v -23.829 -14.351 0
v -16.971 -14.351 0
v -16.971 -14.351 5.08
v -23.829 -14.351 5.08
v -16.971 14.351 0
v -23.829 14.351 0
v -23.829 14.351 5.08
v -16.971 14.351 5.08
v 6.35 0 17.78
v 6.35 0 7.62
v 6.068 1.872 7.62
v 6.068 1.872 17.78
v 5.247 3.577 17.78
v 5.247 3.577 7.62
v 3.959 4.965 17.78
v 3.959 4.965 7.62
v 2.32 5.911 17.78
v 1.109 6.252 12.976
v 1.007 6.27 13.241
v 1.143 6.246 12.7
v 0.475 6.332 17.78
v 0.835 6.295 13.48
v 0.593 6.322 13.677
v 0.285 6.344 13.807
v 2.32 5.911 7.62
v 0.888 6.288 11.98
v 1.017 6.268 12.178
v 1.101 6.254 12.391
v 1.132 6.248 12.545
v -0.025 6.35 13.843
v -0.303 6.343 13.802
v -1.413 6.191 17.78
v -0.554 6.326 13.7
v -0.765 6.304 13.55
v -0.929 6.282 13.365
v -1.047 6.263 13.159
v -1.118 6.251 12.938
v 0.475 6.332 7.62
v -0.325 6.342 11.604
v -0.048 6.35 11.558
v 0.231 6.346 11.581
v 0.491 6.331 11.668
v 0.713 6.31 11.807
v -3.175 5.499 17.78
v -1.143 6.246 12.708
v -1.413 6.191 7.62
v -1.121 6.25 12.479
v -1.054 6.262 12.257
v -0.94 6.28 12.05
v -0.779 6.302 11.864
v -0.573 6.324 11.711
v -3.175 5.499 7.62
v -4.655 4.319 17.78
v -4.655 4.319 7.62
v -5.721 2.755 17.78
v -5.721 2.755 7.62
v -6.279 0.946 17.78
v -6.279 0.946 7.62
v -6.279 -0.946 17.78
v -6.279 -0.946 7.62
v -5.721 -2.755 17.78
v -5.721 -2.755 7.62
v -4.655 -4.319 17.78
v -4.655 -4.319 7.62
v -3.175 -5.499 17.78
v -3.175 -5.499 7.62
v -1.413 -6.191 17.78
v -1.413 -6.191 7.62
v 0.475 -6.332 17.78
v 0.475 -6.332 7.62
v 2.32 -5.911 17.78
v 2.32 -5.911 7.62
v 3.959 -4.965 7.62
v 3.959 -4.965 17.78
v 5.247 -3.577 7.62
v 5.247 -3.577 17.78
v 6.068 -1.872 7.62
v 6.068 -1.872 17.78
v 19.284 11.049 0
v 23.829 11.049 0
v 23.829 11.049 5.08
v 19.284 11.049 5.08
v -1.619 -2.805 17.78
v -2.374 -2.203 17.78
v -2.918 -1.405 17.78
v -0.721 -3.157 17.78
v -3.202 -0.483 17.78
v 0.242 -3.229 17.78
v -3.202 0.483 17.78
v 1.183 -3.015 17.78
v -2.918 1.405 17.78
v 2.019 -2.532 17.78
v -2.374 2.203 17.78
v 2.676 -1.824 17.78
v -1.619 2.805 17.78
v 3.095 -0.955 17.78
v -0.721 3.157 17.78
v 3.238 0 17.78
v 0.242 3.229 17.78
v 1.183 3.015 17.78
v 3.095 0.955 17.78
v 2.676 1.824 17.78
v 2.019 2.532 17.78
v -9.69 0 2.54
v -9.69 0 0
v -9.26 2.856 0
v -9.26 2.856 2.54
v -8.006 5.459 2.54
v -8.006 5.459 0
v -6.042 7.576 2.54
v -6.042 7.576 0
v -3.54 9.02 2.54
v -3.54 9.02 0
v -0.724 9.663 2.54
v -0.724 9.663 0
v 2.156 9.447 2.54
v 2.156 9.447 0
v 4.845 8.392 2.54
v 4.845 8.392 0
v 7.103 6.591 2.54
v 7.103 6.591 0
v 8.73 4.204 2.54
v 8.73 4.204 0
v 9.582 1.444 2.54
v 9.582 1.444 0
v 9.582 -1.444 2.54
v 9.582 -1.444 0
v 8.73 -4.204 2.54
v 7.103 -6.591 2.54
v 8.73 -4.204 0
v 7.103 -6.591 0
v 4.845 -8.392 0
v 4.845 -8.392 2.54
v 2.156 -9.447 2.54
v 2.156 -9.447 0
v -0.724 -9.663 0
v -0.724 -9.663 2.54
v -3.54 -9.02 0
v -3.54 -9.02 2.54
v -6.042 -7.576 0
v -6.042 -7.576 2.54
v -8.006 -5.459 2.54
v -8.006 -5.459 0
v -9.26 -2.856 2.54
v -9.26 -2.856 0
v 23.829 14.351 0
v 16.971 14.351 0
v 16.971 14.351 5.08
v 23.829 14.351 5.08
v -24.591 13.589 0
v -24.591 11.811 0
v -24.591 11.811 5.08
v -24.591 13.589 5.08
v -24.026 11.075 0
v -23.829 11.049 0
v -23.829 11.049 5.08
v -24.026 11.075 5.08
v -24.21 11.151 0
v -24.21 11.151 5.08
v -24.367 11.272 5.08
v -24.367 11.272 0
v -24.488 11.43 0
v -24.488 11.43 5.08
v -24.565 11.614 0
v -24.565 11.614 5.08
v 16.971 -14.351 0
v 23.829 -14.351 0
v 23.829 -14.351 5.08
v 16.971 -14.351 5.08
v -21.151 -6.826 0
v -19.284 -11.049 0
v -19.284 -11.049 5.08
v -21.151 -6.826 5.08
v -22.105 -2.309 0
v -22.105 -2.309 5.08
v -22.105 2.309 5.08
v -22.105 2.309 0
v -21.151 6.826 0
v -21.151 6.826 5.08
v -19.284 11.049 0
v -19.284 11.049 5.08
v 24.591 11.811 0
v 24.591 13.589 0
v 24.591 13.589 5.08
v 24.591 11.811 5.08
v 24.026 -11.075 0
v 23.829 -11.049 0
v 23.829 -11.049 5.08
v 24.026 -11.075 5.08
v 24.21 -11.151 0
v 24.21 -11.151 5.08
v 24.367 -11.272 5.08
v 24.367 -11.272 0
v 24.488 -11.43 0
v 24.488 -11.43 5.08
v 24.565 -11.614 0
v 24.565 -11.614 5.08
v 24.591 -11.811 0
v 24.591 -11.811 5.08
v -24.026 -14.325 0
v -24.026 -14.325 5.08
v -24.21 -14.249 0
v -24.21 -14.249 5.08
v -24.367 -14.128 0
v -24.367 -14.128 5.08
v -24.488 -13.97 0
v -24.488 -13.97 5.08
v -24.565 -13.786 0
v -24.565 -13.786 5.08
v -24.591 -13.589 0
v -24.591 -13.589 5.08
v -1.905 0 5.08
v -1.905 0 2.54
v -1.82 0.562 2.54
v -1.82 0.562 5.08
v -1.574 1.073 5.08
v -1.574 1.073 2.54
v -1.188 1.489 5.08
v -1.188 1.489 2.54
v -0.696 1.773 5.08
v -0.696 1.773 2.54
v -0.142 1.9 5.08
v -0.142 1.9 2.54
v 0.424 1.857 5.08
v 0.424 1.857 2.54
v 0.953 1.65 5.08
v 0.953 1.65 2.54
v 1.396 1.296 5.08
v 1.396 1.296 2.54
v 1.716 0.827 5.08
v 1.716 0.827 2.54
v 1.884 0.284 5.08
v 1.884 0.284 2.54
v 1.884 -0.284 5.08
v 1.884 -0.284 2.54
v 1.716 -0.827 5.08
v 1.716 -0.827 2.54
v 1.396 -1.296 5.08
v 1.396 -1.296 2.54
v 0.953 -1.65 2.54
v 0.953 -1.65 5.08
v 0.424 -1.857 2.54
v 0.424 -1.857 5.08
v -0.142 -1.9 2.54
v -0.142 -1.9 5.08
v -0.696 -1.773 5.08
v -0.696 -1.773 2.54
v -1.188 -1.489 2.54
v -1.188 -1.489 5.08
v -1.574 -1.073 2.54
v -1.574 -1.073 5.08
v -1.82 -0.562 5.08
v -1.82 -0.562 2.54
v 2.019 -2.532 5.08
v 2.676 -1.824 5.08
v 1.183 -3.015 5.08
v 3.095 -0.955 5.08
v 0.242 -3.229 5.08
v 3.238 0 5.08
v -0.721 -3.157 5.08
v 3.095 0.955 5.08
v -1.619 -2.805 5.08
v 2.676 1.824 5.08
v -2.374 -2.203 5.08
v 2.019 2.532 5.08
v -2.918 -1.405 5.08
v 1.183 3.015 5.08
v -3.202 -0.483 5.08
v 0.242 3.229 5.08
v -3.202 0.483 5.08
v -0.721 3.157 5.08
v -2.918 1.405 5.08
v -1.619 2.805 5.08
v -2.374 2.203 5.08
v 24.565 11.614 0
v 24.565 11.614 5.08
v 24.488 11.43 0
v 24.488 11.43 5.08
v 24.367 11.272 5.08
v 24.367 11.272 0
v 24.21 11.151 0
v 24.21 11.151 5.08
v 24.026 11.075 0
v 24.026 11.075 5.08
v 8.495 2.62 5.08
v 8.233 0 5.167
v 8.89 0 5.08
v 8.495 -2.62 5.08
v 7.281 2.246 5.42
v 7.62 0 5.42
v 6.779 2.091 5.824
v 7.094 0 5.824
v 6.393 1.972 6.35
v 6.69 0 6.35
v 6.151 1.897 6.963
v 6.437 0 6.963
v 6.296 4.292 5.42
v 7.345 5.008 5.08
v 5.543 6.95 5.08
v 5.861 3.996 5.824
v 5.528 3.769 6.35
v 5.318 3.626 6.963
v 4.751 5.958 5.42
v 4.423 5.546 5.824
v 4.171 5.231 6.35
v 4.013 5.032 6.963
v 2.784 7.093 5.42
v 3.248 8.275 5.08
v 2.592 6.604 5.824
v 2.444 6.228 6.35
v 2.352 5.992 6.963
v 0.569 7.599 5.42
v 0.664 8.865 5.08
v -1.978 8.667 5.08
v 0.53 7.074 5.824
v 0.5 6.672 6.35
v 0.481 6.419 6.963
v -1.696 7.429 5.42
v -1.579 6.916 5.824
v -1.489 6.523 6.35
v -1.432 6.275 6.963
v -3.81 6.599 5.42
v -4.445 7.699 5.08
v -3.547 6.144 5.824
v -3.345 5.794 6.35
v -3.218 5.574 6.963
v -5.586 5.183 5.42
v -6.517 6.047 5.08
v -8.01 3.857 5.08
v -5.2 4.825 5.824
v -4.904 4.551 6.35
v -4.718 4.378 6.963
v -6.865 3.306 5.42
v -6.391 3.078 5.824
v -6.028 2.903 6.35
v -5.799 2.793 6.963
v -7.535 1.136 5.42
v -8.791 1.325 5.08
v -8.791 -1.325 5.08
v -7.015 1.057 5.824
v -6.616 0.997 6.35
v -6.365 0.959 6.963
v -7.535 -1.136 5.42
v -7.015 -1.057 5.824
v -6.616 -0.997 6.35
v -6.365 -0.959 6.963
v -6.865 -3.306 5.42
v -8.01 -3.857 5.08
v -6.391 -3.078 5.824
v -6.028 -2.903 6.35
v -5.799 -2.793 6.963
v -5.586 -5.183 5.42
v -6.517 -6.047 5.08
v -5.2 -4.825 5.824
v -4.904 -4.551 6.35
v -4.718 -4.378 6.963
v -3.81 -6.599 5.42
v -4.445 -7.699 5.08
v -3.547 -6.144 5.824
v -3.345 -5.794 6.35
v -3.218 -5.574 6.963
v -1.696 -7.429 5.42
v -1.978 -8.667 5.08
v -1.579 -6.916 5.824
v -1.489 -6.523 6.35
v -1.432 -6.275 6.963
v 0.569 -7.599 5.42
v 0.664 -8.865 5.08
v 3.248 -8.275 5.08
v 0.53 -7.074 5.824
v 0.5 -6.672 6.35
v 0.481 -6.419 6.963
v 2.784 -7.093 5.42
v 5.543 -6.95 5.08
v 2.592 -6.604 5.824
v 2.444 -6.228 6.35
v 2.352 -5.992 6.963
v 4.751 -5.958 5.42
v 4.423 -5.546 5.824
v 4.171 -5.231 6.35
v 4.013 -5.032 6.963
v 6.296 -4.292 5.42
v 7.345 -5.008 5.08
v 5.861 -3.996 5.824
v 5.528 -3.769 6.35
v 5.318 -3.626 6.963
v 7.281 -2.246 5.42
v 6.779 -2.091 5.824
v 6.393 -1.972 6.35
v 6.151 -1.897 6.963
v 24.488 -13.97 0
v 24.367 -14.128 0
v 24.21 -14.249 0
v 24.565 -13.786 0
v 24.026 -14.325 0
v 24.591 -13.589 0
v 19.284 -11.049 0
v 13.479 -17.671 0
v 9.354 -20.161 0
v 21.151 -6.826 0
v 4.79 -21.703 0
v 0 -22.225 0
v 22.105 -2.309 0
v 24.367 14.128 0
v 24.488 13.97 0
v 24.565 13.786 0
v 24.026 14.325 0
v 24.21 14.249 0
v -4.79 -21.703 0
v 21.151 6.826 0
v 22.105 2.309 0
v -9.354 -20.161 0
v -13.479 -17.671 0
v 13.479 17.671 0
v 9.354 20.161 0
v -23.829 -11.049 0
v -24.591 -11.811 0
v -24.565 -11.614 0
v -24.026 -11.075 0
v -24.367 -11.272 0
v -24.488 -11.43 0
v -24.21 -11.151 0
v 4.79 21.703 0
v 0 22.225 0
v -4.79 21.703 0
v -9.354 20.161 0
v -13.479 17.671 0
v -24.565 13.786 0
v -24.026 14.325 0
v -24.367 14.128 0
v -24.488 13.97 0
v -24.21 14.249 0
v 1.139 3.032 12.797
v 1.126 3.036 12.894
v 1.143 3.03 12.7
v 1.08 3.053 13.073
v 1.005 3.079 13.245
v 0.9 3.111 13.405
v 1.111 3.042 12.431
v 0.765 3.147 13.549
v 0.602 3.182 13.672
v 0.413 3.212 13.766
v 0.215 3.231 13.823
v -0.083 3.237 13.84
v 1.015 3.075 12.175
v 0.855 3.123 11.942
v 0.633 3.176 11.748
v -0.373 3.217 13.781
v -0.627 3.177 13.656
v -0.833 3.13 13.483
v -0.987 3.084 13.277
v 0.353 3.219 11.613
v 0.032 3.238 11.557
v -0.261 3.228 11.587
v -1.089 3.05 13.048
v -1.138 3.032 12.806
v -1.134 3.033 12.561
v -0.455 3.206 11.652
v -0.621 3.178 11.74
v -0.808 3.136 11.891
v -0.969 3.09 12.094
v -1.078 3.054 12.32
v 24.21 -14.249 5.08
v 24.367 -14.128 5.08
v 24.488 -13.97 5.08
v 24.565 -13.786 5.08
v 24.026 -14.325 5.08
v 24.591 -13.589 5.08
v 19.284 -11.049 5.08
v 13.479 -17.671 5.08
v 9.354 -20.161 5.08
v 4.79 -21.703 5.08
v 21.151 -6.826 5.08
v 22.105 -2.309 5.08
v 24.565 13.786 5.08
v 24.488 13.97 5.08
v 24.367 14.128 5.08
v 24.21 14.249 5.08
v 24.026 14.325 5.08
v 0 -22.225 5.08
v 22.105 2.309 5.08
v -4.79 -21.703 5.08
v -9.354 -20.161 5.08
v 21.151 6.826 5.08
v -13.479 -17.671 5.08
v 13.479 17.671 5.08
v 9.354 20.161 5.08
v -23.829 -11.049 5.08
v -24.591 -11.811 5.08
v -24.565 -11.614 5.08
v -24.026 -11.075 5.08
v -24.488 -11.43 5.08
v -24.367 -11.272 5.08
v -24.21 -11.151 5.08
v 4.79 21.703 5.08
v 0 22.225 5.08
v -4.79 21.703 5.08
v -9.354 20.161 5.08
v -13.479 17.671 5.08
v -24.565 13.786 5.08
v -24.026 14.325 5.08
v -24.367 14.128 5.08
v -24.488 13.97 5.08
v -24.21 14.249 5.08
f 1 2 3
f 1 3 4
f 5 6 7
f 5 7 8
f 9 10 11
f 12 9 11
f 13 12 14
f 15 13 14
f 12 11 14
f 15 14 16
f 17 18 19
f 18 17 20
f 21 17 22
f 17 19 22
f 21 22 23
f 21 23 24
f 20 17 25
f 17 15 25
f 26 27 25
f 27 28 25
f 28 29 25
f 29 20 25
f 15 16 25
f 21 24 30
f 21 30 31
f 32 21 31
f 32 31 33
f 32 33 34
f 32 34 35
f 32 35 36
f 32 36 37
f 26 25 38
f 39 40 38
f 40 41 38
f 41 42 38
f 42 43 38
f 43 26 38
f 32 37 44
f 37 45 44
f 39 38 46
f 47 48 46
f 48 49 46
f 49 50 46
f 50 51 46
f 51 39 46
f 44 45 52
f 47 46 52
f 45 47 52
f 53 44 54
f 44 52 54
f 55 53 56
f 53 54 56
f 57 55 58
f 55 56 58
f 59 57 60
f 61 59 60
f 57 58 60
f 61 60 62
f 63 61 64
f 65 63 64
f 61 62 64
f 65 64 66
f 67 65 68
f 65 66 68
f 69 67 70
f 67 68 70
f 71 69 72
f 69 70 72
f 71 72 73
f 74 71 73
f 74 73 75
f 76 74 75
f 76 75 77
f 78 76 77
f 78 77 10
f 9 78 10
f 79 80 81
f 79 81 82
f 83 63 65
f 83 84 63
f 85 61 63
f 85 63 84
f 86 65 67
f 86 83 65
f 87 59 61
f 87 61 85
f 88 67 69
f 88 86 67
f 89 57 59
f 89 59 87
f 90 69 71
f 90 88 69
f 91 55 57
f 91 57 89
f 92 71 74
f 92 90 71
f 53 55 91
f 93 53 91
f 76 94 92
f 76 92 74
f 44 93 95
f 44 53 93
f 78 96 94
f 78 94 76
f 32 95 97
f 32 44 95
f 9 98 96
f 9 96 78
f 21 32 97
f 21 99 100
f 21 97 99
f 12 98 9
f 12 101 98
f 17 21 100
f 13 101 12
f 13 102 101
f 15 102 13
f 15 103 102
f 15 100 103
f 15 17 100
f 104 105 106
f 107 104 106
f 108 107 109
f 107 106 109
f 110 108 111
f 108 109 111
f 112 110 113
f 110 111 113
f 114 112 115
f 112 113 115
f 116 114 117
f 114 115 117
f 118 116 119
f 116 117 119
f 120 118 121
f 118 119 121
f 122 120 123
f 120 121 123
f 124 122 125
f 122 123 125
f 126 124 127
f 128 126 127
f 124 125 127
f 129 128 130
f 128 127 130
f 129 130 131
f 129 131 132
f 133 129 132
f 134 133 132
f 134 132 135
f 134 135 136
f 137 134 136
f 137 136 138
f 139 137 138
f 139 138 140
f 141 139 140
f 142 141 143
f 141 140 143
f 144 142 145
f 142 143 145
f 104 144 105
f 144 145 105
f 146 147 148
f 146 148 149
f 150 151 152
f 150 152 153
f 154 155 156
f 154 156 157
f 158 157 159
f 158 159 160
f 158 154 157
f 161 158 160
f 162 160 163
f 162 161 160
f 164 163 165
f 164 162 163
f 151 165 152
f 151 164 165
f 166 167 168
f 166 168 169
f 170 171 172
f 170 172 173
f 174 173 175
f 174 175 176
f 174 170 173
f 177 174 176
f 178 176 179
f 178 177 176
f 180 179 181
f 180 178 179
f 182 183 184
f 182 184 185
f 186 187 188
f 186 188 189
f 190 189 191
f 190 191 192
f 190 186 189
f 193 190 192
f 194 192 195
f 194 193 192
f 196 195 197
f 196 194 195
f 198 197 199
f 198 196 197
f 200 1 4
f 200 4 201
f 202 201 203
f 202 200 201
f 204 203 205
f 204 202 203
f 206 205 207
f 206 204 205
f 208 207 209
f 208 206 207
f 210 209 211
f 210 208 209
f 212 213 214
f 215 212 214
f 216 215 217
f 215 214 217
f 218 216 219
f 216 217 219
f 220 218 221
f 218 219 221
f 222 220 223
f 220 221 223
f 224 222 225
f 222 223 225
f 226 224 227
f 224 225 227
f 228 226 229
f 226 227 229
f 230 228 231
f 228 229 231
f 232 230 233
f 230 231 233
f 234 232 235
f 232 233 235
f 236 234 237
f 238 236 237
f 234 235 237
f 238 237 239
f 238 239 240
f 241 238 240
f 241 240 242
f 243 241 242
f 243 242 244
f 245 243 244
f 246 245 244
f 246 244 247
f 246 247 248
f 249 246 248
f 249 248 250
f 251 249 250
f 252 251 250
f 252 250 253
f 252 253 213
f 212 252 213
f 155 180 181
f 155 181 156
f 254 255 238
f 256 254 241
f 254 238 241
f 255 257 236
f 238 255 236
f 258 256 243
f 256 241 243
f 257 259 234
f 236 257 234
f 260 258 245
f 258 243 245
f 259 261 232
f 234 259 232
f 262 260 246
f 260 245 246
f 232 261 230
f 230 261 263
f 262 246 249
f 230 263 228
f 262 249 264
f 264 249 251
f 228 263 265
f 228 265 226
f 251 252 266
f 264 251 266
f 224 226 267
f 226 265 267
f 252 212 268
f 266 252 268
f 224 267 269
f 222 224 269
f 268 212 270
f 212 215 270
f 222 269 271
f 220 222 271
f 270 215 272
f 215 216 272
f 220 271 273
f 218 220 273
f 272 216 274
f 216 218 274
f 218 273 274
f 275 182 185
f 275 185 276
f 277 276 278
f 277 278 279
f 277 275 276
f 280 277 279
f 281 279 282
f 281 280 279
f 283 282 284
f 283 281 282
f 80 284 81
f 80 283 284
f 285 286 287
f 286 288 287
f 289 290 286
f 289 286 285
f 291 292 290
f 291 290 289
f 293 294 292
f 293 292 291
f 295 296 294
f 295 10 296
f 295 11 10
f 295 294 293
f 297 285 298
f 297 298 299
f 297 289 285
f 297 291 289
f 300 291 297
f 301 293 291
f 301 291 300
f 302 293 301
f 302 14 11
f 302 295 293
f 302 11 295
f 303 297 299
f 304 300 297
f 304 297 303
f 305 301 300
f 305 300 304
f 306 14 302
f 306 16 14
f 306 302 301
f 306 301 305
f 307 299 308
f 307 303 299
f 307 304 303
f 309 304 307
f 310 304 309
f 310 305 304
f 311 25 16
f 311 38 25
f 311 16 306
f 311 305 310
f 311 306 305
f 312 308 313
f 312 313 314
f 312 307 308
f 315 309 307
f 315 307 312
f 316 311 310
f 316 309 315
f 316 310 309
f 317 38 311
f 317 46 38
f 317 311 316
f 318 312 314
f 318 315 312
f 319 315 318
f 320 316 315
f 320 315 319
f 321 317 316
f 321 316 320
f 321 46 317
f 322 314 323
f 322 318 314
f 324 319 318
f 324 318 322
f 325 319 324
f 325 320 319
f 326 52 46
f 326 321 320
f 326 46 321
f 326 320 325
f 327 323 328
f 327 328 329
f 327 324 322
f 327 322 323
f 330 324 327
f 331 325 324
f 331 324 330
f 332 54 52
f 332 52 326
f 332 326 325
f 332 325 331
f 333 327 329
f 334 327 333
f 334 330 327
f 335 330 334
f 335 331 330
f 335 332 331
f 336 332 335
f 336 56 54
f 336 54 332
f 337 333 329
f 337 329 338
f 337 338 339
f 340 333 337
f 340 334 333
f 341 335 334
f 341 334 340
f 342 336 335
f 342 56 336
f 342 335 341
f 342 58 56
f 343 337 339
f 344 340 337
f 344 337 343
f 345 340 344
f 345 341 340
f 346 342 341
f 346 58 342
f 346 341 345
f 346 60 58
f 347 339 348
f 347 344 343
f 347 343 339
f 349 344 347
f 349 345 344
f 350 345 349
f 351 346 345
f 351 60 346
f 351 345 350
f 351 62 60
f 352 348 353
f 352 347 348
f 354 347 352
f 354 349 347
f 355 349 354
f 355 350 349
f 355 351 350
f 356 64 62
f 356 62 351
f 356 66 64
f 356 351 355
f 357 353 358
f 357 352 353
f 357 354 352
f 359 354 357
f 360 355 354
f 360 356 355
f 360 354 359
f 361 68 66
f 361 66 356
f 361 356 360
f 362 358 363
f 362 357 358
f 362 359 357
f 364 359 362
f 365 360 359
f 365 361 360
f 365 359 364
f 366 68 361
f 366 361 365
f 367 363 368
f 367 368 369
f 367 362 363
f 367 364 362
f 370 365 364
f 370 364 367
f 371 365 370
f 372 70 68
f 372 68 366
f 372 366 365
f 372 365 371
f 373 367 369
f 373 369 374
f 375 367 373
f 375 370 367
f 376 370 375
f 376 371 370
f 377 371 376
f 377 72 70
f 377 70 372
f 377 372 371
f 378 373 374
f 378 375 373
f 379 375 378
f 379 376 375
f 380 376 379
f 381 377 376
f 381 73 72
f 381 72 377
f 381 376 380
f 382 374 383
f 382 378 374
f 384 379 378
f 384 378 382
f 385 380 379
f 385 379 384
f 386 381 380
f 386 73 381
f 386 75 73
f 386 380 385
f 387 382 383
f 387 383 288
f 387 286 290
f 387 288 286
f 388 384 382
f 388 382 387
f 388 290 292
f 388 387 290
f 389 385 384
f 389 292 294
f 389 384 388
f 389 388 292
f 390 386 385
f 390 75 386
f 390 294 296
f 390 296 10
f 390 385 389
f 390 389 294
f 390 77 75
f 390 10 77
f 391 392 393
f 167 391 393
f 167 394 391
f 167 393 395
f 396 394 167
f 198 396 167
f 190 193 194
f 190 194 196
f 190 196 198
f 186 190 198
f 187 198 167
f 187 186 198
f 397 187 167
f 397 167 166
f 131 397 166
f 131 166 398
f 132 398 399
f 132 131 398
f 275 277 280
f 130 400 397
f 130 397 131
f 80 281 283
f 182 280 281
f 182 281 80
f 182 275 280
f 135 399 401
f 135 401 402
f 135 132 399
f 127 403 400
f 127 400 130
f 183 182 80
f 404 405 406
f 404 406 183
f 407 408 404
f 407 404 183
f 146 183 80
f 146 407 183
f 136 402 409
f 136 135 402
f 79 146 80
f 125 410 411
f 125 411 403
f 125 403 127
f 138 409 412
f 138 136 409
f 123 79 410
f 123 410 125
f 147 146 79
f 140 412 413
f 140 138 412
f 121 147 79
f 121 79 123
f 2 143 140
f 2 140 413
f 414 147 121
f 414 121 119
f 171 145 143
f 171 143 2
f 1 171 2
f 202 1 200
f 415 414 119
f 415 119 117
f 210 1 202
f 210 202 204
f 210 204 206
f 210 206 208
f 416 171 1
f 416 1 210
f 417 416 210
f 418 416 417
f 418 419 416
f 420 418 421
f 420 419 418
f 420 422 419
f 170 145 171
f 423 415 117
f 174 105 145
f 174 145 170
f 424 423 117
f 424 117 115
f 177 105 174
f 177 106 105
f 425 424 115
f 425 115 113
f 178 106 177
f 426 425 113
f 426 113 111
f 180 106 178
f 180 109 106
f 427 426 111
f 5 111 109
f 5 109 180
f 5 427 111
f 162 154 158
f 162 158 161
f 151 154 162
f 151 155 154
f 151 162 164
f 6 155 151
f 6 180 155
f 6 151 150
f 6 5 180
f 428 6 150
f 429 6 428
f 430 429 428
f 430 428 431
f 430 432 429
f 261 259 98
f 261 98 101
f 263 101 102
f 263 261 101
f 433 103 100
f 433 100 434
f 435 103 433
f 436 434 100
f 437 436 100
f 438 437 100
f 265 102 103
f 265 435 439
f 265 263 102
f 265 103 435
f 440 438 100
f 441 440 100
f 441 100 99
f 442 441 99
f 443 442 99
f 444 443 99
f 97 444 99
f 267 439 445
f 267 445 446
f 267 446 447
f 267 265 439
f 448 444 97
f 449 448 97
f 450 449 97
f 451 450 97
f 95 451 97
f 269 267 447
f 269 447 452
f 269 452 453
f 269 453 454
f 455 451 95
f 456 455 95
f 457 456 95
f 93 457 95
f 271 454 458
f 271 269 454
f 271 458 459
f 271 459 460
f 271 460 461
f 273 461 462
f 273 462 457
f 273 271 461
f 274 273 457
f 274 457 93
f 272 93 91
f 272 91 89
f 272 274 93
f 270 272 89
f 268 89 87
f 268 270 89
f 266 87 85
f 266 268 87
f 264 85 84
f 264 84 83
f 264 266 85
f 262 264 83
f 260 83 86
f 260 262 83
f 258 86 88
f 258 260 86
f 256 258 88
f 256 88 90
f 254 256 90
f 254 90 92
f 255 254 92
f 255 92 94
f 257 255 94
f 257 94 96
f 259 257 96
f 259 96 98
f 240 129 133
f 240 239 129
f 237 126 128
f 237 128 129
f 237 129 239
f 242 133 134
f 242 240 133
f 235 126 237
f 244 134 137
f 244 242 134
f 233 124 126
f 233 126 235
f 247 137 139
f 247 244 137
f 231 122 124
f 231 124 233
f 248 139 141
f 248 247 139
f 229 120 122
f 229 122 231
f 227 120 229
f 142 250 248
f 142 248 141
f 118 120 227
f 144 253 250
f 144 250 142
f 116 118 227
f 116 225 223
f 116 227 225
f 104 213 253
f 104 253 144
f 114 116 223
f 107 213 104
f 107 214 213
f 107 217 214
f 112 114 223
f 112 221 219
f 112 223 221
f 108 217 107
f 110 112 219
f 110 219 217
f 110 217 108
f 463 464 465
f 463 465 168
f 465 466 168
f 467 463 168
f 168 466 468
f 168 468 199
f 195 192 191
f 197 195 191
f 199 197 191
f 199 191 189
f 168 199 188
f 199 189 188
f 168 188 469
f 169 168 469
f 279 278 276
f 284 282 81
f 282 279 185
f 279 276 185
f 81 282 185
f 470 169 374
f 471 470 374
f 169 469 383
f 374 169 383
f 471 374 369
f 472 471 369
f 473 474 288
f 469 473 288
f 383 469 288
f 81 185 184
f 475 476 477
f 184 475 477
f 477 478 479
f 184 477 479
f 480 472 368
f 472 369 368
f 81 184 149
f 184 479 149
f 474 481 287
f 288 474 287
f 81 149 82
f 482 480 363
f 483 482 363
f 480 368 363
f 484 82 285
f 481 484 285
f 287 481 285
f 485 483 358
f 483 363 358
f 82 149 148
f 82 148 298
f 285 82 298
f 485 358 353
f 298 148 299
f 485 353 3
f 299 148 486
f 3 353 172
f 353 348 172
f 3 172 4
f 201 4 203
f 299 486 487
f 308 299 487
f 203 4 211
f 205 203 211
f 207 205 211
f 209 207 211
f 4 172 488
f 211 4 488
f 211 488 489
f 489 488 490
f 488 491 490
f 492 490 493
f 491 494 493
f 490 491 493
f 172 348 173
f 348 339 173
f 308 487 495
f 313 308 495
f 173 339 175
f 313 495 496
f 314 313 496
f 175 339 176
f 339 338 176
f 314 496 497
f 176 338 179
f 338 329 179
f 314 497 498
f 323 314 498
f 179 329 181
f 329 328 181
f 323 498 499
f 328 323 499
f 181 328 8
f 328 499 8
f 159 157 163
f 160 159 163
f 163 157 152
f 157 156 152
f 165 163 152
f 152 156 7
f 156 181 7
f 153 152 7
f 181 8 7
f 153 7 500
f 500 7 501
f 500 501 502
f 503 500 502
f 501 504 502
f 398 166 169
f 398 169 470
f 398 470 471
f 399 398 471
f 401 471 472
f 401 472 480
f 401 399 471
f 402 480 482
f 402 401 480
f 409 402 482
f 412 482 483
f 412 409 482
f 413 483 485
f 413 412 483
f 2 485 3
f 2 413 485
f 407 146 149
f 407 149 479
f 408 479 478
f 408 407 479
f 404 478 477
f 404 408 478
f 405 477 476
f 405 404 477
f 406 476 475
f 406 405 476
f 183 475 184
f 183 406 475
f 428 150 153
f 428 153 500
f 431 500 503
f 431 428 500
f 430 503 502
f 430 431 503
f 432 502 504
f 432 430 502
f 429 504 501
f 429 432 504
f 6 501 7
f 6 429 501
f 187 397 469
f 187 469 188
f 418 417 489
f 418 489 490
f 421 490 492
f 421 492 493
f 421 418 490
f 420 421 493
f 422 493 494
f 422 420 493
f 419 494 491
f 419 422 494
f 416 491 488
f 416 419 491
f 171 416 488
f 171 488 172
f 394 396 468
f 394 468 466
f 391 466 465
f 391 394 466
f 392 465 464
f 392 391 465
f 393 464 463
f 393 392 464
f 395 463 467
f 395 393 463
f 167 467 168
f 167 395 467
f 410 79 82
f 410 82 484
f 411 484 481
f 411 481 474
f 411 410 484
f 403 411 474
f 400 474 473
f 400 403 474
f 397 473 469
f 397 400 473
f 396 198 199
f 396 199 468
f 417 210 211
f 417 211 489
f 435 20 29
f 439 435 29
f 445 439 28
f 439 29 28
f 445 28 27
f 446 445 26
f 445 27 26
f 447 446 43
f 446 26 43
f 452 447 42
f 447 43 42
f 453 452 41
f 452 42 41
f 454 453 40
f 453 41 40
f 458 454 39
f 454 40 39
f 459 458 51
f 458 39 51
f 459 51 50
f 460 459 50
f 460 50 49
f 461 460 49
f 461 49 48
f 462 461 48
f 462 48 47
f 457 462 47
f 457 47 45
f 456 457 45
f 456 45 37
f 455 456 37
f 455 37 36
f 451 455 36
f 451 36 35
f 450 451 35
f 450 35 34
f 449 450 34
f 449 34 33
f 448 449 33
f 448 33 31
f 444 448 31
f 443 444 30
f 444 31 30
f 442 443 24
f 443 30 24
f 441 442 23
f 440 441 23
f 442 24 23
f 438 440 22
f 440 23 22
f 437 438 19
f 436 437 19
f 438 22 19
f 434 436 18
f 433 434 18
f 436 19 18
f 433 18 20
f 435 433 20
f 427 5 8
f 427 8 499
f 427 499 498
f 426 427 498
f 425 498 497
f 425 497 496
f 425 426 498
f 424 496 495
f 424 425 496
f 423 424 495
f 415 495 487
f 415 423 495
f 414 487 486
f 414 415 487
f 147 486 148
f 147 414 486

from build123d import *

# Parameters (mm, degrees)
BOSS_EXTRUDE1_DEPTH = 5.08
SKETCH5_R           = 9.6901
CUT_EXTRUDE2_DEPTH  = 2.54
SKETCH6_R           = 6.35
SKETCH6_R_2         = 3.2385
BOSS_EXTRUDE4_DEPTH = 12.7
FILLET1_R           = 2.54
SKETCH8_R           = 1.143
CUT_EXTRUDE3_DEPTH  = 7.62
SKETCH9_R           = 1.905
CUT_EXTRUDE4_DEPTH  = 16.2400001


with BuildPart() as part:
    # Sketch1 → Boss-Extrude1 (new body)
    with BuildSketch(Plane.XY):
        with BuildLine():
            Line((-23.828545778, 14.351), (-16.970545778, 14.351))
            ThreePointArc((-16.970545778, 14.351), (0, 22.225), (16.970545778, 14.351))
            Line((16.970545778, 14.351), (23.828545778, 14.351))
            ThreePointArc((23.828545778, 14.351), (24.367361145, 14.127815367), (24.590545778, 13.589))
            Line((24.590545778, 13.589), (24.590545778, 11.811))
            ThreePointArc((24.590545778, 11.811), (24.367361145, 11.272184633), (23.828545778, 11.049))
            Line((23.828545778, 11.049), (19.283936942, 11.049))
            ThreePointArc((19.283936942, 11.049), (22.225, 0), (19.283936942, -11.049))
            Line((19.283936942, -11.049), (23.828545778, -11.049))
            ThreePointArc((23.828545778, -11.049), (24.367361145, -11.272184633), (24.590545778, -11.811))
            Line((24.590545778, -11.811), (24.590545778, -13.589))
            ThreePointArc((24.590545778, -13.589), (24.367361145, -14.127815367), (23.828545778, -14.351))
            Line((23.828545778, -14.351), (16.970545778, -14.351))
            ThreePointArc((16.970545778, -14.351), (0, -22.225), (-16.970545778, -14.351))
            Line((-16.970545778, -14.351), (-23.828545778, -14.351))
            ThreePointArc((-23.828545778, -14.351), (-24.367361145, -14.127815367), (-24.590545778, -13.589))
            Line((-24.590545778, -13.589), (-24.590545778, -11.811))
            ThreePointArc((-24.590545778, -11.811), (-24.367361145, -11.272184633), (-23.828545778, -11.049))
            Line((-23.828545778, -11.049), (-19.283936942, -11.049))
            ThreePointArc((-19.283936942, -11.049), (-22.225, 0), (-19.283936942, 11.049))
            Line((-19.283936942, 11.049), (-23.828545778, 11.049))
            ThreePointArc((-23.828545778, 11.049), (-24.367361145, 11.272184633), (-24.590545778, 11.811))
            Line((-24.590545778, 11.811), (-24.590545778, 13.589))
            ThreePointArc((-24.590545778, 13.589), (-24.367361145, 14.127815367), (-23.828545778, 14.351))
        make_face()
    extrude(amount=BOSS_EXTRUDE1_DEPTH)

    # Sketch5 → Cut-Extrude2 (cut)
    with BuildSketch(Plane(origin=(0, 0, 0), x_dir=(-1, 0, 0), z_dir=(0, 0, -1))):
        Circle(SKETCH5_R)
    extrude(amount=-CUT_EXTRUDE2_DEPTH, mode=Mode.SUBTRACT)

    # Sketch6 → Boss-Extrude4 (add)
    with BuildSketch(Plane.XY.offset(5.08)):
        Circle(SKETCH6_R)
        Circle(SKETCH6_R_2, mode=Mode.SUBTRACT)
    extrude(amount=BOSS_EXTRUDE4_DEPTH)

    # Fillet1
    fillet1_edges = [part.edges().sort_by_distance(p)[0] for p in [
        (-6.35, 0, 5.08),
    ]]
    fillet(fillet1_edges, radius=FILLET1_R)

    # Sketch8 → Cut-Extrude3 (cut)
    with BuildSketch(Plane(origin=(0, 6.35, 0), x_dir=(1, 0, 0), z_dir=(0, 1, 0))):
        with Locations((0, -12.7)):
            Circle(SKETCH8_R)
    extrude(amount=-CUT_EXTRUDE3_DEPTH, mode=Mode.SUBTRACT)

    # Sketch9 → Cut-Extrude4 (cut, through all)
    with BuildSketch(Plane(origin=(0, 0, 2.54), x_dir=(-1, 0, 0), z_dir=(0, 0, -1))):
        Circle(SKETCH9_R)
    extrude(amount=-CUT_EXTRUDE4_DEPTH, mode=Mode.SUBTRACT)


solid = part.part
